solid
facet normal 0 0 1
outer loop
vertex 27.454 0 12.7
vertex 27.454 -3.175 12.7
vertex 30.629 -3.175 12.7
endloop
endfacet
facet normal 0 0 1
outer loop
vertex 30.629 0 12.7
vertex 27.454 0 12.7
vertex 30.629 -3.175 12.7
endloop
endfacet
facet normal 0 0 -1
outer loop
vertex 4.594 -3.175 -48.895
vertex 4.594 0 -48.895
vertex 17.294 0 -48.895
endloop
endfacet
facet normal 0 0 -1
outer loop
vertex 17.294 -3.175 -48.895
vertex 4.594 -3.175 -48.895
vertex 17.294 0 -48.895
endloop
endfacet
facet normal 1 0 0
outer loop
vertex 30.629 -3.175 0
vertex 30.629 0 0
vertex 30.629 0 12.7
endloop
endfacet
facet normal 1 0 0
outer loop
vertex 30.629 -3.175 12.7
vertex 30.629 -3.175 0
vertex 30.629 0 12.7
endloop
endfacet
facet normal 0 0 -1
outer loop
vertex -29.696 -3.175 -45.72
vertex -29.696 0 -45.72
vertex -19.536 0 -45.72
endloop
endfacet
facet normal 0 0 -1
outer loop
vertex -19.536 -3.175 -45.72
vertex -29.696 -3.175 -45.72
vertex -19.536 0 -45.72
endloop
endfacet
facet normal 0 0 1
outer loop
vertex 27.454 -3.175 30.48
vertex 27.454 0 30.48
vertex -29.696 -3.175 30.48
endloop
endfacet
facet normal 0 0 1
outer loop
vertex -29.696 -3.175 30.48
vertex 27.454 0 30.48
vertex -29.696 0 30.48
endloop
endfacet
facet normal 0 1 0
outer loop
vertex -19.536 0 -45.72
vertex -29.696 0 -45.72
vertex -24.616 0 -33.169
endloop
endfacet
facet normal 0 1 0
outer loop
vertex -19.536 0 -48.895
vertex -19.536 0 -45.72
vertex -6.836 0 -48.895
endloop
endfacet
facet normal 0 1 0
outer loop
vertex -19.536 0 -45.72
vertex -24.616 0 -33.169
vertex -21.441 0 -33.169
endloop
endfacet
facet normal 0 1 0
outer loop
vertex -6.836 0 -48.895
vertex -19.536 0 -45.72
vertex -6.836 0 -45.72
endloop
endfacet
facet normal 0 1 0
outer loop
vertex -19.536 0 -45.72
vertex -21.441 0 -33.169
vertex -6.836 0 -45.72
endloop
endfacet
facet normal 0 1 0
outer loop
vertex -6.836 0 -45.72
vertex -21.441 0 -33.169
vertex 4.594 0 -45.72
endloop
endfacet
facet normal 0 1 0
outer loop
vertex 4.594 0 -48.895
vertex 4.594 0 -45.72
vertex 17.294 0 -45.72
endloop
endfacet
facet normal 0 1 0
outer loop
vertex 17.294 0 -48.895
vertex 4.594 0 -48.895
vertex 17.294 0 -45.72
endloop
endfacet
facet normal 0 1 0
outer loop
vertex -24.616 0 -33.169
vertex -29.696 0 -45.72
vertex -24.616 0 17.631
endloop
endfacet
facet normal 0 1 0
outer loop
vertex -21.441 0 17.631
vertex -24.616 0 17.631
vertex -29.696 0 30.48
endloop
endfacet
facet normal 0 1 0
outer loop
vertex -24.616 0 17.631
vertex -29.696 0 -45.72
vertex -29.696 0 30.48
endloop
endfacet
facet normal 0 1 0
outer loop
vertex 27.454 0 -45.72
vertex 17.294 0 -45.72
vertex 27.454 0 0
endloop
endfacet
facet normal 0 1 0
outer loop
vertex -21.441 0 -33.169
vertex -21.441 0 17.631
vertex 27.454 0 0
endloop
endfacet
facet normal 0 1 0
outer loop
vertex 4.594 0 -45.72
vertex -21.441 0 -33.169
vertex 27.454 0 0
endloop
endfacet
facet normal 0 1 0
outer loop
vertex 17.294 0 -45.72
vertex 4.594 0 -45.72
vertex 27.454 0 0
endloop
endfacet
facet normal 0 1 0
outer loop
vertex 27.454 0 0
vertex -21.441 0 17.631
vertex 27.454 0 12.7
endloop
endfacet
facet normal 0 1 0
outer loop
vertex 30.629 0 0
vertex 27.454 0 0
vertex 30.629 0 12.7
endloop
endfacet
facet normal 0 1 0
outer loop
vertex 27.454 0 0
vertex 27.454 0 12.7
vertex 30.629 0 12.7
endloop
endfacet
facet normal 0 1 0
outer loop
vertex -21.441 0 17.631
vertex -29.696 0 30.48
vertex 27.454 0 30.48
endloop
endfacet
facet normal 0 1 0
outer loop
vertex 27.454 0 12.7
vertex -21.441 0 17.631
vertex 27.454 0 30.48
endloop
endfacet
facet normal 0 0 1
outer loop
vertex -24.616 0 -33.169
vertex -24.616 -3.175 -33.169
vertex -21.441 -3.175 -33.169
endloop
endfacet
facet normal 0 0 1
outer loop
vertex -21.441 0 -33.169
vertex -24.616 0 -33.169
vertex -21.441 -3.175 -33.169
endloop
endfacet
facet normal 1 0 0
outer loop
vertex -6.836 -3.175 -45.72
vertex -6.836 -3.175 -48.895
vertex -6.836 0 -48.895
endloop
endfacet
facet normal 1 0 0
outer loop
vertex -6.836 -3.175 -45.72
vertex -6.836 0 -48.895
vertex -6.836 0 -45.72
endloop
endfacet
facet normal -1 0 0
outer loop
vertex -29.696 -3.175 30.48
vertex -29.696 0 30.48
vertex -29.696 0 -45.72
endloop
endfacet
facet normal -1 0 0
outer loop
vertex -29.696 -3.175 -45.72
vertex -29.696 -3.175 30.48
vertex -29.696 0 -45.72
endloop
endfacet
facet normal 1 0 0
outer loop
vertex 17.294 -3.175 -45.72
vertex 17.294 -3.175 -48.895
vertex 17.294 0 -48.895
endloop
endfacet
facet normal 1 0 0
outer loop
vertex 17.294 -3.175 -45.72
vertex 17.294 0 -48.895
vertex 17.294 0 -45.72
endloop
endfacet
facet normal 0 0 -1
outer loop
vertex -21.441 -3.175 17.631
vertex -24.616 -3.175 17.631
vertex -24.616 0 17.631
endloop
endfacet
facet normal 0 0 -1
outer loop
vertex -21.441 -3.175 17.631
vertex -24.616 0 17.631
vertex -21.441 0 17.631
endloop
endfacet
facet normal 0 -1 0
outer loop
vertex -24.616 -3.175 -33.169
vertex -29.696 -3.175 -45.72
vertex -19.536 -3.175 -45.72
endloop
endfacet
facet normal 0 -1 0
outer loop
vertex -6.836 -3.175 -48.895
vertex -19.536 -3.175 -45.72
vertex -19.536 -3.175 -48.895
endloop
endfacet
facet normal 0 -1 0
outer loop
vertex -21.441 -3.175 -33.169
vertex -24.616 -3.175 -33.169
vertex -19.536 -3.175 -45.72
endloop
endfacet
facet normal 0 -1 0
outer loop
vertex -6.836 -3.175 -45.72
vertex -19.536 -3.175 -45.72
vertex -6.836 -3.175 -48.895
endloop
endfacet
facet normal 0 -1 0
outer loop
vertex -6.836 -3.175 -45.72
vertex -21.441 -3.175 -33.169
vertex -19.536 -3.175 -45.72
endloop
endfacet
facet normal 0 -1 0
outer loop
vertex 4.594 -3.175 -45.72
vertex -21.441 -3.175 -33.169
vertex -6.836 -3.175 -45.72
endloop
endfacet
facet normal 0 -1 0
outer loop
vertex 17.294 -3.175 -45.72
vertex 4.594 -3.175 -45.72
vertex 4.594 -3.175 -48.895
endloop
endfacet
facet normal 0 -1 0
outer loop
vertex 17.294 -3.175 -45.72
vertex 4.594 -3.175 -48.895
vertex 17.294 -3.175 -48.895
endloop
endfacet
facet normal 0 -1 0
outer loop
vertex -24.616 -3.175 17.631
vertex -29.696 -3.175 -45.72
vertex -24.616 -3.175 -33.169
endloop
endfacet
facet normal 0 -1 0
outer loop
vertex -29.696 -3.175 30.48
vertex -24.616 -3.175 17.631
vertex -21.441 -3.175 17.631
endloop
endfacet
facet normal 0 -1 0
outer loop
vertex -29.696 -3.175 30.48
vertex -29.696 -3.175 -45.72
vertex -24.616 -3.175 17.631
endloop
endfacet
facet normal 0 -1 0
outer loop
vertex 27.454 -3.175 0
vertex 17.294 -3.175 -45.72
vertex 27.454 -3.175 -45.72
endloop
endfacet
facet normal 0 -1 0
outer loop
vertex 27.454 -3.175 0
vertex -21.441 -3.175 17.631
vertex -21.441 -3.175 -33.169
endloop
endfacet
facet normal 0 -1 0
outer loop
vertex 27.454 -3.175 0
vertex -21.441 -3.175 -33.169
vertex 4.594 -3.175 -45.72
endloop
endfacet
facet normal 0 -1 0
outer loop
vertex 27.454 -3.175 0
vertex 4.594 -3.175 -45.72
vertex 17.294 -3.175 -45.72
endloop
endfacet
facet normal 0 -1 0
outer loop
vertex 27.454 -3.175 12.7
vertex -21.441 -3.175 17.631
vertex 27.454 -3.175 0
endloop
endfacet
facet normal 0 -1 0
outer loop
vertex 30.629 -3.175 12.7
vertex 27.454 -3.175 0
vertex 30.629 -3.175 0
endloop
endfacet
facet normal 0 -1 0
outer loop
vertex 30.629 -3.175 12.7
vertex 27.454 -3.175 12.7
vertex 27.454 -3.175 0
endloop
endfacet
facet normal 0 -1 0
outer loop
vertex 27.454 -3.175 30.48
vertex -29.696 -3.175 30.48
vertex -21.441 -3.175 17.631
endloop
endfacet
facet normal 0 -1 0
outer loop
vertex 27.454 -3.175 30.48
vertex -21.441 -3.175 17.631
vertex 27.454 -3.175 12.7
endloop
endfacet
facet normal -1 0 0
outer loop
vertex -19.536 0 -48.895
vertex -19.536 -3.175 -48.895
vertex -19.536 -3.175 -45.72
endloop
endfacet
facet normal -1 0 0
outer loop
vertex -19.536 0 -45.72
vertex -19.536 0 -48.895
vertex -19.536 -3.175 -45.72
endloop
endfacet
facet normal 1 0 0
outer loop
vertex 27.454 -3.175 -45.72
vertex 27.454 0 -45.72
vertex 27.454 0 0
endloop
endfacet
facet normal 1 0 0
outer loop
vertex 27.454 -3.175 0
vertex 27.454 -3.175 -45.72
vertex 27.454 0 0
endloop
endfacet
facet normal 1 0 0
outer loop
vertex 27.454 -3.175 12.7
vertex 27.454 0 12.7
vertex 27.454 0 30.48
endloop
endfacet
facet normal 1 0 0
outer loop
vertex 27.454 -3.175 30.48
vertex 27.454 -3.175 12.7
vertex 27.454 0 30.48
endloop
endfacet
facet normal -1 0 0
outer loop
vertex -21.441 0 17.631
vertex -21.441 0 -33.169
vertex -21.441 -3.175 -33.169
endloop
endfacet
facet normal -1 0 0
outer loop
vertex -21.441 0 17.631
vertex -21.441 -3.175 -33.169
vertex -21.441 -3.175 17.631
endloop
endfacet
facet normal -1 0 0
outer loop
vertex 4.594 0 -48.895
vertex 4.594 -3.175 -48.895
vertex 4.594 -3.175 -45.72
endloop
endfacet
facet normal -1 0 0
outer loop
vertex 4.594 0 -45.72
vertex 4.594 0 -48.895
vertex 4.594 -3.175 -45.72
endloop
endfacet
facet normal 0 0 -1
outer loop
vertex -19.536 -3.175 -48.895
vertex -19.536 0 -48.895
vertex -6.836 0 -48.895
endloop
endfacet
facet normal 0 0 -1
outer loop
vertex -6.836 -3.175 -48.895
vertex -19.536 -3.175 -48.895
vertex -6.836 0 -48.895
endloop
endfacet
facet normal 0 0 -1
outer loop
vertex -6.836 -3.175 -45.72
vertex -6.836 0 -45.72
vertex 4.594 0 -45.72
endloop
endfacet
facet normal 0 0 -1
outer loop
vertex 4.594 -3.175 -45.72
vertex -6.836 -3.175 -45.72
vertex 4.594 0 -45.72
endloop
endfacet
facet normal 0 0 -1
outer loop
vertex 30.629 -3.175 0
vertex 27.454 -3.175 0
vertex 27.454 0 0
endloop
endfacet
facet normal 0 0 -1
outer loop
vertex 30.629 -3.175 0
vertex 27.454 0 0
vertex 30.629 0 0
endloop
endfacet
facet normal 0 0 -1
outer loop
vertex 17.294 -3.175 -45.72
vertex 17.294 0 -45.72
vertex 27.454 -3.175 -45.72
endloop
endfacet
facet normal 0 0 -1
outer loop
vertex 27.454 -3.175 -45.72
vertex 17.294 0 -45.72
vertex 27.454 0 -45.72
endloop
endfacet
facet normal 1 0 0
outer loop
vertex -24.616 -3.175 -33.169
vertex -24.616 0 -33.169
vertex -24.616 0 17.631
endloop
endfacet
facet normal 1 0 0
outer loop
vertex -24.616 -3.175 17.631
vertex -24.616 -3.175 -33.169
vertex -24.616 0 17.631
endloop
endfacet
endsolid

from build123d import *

# Parameters (mm, degrees)
F0_W     = 3.175
F0_H     = 50.8
F0_W_2   = 12.7
F0_H_2   = 3.175
F0_H_3   = 12.7
F1_DEPTH = 3.175


with BuildPart() as f1:
    # F0 (on Front) → F1 (new body)
    with BuildSketch(Plane.XZ):
        Polygon((27.454122, 30.48), (-29.695878, 30.48), (-29.695878, -45.72), (-19.535878, -45.72), (-6.835878, -45.72), (4.594122, -45.72), (17.294122, -45.72), (27.454122, -45.72), (27.454122, 0), (27.454122, 12.7), align=None)
        with Locations((-23.028378, -7.76909)):
            Rectangle(F0_W, F0_H, mode=Mode.SUBTRACT)
        with Locations((-13.185878, -47.3075)):
            Rectangle(F0_W_2, F0_H_2)
        with Locations((10.944122, -47.3075)):
            Rectangle(F0_W_2, F0_H_2)
        with Locations((29.041622, 6.35)):
            Rectangle(F0_W, F0_H_3)
    extrude(amount=F1_DEPTH)


solid = f1.part
